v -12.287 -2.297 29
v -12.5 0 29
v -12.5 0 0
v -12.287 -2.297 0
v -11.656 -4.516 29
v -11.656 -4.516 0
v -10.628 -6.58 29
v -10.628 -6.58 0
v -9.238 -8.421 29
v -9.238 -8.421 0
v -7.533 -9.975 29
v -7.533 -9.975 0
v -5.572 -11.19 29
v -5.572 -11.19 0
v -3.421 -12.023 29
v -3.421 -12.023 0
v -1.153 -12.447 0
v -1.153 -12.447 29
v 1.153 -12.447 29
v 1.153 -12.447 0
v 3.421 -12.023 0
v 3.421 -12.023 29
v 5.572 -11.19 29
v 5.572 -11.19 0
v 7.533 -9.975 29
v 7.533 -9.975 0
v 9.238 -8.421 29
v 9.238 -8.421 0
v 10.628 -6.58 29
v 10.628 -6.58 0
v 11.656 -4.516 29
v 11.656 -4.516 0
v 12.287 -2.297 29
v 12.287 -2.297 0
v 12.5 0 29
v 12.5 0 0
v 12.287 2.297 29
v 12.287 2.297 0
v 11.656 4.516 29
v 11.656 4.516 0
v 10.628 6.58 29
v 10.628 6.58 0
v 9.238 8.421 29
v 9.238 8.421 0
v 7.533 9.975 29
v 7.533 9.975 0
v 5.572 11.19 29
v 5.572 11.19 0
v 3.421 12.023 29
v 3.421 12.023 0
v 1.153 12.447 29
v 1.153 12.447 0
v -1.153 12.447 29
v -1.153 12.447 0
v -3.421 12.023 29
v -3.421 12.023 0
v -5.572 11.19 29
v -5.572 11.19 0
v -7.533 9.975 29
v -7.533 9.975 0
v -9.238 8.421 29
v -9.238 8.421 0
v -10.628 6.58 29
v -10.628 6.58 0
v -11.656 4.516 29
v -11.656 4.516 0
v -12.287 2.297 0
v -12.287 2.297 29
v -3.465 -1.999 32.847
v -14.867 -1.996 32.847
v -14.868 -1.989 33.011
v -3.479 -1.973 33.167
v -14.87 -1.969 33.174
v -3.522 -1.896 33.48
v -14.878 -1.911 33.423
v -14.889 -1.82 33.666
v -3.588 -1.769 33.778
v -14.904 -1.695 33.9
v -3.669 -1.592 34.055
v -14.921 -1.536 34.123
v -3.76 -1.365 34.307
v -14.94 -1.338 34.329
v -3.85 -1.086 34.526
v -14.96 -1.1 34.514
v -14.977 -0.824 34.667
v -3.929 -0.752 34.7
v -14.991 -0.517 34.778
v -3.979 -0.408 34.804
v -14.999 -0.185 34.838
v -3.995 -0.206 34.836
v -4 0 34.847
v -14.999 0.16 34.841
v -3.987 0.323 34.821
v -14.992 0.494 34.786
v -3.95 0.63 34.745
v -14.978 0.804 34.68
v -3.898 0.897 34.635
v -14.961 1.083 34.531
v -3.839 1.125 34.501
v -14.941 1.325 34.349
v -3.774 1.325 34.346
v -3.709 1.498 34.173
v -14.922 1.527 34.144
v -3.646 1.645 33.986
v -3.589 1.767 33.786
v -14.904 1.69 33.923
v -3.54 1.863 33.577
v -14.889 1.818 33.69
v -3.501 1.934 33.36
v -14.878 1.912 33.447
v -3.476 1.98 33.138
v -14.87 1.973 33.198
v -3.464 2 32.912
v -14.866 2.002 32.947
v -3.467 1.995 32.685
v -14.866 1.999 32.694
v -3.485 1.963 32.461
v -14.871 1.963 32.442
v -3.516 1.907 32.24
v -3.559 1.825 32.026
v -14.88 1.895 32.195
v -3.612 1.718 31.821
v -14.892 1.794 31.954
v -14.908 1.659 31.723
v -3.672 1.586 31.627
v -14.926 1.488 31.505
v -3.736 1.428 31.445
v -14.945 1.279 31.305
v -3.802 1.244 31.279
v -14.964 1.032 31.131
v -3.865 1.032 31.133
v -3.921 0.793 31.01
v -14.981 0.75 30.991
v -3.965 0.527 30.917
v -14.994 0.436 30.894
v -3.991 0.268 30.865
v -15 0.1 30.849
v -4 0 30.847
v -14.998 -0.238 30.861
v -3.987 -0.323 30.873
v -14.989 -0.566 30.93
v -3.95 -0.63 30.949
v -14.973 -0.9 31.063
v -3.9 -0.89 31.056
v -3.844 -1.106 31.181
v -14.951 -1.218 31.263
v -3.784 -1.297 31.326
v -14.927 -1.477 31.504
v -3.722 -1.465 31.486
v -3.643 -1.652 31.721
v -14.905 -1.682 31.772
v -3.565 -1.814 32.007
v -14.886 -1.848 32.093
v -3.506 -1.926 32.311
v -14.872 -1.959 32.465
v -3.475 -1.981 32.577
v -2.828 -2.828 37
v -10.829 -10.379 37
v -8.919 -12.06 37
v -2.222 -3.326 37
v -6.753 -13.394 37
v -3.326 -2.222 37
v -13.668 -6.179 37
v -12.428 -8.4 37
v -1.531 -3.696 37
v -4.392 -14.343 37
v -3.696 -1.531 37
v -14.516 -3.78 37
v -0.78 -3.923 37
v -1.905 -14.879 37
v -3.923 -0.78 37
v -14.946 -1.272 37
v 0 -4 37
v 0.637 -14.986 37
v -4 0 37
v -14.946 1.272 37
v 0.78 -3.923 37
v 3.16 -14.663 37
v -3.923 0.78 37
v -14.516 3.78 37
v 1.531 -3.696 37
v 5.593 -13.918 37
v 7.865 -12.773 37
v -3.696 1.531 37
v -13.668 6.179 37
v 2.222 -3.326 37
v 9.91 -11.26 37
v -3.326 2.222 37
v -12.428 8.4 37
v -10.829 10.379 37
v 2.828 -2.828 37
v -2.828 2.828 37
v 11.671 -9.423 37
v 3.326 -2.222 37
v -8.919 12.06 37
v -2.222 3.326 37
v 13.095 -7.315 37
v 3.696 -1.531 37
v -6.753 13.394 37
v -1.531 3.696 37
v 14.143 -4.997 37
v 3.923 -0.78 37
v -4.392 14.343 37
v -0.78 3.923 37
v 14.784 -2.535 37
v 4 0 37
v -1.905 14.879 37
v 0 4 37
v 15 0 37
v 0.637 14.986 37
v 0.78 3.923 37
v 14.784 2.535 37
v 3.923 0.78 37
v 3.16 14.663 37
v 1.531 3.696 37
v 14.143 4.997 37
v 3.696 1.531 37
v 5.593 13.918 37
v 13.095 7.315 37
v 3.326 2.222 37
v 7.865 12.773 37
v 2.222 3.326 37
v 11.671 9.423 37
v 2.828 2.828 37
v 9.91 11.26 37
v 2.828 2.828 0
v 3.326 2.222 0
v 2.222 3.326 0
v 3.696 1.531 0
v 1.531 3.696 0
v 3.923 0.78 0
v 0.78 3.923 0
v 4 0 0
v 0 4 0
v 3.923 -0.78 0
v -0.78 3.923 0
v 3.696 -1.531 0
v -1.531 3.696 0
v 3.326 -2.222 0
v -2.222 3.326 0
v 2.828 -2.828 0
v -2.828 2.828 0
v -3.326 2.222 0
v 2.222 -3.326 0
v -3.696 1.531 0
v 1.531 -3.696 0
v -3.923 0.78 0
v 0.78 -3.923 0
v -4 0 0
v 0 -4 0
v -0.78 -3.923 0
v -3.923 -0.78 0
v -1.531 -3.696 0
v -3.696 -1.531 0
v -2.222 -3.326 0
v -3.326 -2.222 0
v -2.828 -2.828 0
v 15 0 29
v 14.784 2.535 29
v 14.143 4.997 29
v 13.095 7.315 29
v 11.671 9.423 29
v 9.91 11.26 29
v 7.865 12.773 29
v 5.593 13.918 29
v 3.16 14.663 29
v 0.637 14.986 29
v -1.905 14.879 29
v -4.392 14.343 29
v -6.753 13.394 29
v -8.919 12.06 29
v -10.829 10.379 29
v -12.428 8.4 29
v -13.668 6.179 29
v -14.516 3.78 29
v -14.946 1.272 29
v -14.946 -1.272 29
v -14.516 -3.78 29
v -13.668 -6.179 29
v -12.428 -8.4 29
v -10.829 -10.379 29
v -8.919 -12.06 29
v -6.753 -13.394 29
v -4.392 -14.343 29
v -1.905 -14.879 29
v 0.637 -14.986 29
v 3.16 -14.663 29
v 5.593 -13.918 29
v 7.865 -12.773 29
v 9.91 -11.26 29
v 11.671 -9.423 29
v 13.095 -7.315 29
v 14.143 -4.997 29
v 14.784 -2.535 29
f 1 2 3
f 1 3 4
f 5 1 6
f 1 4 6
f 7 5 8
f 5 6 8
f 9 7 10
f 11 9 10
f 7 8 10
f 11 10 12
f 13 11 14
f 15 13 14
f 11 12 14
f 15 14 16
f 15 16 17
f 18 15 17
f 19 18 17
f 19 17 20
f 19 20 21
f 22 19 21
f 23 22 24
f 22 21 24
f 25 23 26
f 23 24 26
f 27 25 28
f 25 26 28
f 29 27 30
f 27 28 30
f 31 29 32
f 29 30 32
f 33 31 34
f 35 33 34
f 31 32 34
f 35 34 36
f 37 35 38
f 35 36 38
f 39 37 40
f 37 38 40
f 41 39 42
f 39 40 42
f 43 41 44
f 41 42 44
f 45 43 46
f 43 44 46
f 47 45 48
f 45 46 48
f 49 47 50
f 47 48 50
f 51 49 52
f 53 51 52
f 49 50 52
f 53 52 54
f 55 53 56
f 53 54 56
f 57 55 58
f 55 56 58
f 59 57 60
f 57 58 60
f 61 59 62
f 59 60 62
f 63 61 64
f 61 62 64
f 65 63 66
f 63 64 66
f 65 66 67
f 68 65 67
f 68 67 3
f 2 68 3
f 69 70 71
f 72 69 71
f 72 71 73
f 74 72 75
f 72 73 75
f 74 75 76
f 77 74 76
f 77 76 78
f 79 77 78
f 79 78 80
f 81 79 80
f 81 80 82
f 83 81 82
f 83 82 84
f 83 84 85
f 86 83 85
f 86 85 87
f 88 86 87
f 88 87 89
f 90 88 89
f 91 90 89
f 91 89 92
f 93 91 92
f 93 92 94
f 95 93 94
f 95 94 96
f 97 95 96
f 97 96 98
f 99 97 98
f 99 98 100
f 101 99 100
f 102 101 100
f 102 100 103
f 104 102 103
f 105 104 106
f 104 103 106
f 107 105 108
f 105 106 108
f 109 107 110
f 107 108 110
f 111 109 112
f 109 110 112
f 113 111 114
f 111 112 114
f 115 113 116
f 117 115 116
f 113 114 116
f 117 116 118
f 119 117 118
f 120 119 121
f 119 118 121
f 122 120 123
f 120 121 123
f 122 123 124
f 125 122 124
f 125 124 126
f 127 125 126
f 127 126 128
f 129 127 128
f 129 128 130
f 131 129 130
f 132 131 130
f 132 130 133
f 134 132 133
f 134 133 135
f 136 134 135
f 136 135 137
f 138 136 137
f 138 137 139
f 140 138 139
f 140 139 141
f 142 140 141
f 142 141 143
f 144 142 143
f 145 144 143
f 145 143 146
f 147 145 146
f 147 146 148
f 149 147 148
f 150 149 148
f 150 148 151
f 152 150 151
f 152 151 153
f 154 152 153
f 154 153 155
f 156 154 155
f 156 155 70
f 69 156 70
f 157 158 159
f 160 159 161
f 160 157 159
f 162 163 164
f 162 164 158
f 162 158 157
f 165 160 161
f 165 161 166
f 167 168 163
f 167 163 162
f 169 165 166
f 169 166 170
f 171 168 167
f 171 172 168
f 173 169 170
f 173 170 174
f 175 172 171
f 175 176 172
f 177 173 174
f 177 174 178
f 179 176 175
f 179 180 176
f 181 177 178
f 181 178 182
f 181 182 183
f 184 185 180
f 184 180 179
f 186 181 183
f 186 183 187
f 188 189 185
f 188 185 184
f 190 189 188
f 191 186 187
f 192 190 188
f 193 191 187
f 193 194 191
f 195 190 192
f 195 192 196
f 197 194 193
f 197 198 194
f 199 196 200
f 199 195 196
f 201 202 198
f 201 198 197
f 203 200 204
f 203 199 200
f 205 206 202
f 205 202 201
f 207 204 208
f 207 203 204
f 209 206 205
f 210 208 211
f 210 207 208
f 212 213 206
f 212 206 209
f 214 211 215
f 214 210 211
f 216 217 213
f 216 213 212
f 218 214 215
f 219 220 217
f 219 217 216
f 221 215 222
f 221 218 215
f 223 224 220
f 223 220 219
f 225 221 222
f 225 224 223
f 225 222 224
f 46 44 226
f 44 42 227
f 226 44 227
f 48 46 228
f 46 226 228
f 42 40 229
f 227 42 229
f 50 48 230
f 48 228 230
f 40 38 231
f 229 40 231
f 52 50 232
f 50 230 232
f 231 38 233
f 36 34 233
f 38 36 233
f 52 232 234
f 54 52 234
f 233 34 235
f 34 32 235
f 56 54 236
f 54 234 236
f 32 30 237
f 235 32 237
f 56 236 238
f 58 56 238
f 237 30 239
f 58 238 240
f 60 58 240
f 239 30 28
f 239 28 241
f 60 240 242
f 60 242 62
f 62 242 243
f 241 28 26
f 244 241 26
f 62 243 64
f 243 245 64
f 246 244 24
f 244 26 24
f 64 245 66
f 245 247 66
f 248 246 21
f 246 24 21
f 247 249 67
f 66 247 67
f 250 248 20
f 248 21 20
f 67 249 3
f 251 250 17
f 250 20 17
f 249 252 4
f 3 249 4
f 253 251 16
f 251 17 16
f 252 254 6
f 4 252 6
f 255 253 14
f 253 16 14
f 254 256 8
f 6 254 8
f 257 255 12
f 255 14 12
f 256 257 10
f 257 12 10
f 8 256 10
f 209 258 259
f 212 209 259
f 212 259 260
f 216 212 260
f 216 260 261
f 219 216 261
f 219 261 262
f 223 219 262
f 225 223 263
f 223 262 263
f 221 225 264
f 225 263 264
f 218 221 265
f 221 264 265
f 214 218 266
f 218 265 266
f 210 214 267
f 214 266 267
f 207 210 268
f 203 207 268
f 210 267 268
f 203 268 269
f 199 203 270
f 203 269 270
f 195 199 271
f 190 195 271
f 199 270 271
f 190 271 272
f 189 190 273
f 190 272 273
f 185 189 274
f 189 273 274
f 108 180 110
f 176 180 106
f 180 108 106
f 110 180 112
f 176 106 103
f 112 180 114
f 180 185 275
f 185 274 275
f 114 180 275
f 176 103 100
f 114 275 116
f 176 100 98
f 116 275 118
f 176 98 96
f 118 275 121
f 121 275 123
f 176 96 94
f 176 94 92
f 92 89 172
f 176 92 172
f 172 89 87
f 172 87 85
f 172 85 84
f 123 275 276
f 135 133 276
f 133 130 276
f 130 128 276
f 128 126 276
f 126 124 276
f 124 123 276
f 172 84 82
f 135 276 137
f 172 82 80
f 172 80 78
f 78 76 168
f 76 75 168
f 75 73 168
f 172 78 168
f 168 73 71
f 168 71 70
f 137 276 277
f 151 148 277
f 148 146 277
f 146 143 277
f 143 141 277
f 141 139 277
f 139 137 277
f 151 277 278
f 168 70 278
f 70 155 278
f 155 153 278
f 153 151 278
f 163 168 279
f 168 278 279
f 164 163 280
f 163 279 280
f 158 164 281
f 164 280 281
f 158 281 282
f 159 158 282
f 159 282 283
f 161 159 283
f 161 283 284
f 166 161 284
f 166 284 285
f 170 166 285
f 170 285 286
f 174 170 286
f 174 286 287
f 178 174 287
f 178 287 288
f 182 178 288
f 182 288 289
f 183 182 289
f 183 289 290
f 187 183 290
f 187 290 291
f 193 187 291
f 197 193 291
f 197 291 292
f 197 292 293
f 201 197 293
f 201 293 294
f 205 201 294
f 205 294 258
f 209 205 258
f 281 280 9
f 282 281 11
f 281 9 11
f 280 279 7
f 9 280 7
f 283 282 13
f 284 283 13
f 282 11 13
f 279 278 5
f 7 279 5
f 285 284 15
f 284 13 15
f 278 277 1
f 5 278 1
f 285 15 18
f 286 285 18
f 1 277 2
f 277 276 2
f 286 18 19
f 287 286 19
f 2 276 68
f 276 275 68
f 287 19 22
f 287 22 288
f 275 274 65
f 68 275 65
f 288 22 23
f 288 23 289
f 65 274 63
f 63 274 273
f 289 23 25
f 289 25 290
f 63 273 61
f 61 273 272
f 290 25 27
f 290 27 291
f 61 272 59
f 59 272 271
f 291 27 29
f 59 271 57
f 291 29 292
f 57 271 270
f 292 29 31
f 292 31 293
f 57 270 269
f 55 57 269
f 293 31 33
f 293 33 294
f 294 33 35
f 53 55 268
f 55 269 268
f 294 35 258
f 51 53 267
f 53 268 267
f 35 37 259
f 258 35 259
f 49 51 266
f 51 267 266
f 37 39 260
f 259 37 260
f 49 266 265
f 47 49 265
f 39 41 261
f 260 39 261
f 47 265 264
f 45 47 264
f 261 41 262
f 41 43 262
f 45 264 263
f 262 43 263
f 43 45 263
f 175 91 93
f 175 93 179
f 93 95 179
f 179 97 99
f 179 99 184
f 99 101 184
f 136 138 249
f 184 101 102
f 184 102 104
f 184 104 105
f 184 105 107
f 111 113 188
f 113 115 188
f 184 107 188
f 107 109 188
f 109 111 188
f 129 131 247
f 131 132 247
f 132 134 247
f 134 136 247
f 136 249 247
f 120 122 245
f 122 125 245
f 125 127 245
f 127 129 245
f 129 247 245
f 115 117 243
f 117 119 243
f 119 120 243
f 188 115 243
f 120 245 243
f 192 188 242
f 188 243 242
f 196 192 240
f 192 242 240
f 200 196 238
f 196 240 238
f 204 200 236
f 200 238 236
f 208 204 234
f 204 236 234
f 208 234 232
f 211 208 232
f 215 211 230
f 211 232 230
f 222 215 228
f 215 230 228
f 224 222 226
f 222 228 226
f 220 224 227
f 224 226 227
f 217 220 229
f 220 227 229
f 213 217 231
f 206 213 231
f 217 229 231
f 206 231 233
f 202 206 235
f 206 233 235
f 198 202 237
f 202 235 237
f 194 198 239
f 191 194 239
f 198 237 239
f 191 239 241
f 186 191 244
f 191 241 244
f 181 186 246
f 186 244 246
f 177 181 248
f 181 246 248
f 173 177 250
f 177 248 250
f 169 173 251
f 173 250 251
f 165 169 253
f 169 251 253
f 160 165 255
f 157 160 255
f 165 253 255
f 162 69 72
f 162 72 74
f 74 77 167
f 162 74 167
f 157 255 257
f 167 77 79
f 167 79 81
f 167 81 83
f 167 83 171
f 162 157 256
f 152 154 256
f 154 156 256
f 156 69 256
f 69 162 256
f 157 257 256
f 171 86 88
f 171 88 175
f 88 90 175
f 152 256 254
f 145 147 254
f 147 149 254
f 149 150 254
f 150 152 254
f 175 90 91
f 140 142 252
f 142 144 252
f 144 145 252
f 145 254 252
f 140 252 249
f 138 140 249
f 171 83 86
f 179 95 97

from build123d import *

# Parameters (mm, degrees)
SKETCH1_R                  = 12.5
SKETCH1_R_2                = 4
BOSS_EXTRUDE1_DEPTH        = 29
SKETCH2_R                  = 15
BOSS_EXTRUDE2_DEPTH        = 8
SKETCH3_R                  = 4
CUT_EXTRUDE2_DEPTH         = 43.649736224
F_4_0MM_DOWEL_HOLE1_REACH  = 48.947
F_4_0MM_DOWEL_HOLE1_BORE_R = 2


with BuildPart() as part:
    # Sketch1 → Boss-Extrude1 (new body)
    with BuildSketch(Plane.XY):
        with Locations(Location((0, 0, 0), (0, 0, 180))):
            Circle(SKETCH1_R)
        with Locations(Location((0, 0, 0), (0, 0, 180))):
            Circle(SKETCH1_R_2, mode=Mode.SUBTRACT)
    extrude(amount=BOSS_EXTRUDE1_DEPTH)

    # Sketch2 → Boss-Extrude2 (add)
    with BuildSketch(Plane.XY.offset(29)):
        Circle(SKETCH2_R)
    extrude(amount=BOSS_EXTRUDE2_DEPTH)

    # Sketch3 → Cut-Extrude2 (cut, through all)
    with BuildSketch(Plane(origin=(0, 0, 0), x_dir=(-1, 0, 0), z_dir=(0, 0, -1))):
        Circle(SKETCH3_R)
    extrude(amount=-CUT_EXTRUDE2_DEPTH, mode=Mode.SUBTRACT)

    # Ø4.0mm Dowel Hole1 bore (on position points) → Ø4.0mm Dowel Hole1 (cut, up to next)
    with BuildSketch(Plane(origin=(-14.99999933, 0.004483968, 32.846680342), x_dir=(-0.000298931176, -0.99999995532, 0), z_dir=(-0.99999995532, 0.000298931176, 0)), mode=Mode.PRIVATE) as f_4_0mm_dowel_hole1_sk1:
        Circle(F_4_0MM_DOWEL_HOLE1_BORE_R)
    f_4_0mm_dowel_hole1_tool1 = extrude(f_4_0mm_dowel_hole1_sk1.sketch, amount=-F_4_0MM_DOWEL_HOLE1_REACH, mode=Mode.PRIVATE) & part.part
    add(f_4_0mm_dowel_hole1_tool1.solids().sort_by_distance((-14.999999, 0.004484, 32.84668))[0], mode=Mode.SUBTRACT)


solid = part.part
